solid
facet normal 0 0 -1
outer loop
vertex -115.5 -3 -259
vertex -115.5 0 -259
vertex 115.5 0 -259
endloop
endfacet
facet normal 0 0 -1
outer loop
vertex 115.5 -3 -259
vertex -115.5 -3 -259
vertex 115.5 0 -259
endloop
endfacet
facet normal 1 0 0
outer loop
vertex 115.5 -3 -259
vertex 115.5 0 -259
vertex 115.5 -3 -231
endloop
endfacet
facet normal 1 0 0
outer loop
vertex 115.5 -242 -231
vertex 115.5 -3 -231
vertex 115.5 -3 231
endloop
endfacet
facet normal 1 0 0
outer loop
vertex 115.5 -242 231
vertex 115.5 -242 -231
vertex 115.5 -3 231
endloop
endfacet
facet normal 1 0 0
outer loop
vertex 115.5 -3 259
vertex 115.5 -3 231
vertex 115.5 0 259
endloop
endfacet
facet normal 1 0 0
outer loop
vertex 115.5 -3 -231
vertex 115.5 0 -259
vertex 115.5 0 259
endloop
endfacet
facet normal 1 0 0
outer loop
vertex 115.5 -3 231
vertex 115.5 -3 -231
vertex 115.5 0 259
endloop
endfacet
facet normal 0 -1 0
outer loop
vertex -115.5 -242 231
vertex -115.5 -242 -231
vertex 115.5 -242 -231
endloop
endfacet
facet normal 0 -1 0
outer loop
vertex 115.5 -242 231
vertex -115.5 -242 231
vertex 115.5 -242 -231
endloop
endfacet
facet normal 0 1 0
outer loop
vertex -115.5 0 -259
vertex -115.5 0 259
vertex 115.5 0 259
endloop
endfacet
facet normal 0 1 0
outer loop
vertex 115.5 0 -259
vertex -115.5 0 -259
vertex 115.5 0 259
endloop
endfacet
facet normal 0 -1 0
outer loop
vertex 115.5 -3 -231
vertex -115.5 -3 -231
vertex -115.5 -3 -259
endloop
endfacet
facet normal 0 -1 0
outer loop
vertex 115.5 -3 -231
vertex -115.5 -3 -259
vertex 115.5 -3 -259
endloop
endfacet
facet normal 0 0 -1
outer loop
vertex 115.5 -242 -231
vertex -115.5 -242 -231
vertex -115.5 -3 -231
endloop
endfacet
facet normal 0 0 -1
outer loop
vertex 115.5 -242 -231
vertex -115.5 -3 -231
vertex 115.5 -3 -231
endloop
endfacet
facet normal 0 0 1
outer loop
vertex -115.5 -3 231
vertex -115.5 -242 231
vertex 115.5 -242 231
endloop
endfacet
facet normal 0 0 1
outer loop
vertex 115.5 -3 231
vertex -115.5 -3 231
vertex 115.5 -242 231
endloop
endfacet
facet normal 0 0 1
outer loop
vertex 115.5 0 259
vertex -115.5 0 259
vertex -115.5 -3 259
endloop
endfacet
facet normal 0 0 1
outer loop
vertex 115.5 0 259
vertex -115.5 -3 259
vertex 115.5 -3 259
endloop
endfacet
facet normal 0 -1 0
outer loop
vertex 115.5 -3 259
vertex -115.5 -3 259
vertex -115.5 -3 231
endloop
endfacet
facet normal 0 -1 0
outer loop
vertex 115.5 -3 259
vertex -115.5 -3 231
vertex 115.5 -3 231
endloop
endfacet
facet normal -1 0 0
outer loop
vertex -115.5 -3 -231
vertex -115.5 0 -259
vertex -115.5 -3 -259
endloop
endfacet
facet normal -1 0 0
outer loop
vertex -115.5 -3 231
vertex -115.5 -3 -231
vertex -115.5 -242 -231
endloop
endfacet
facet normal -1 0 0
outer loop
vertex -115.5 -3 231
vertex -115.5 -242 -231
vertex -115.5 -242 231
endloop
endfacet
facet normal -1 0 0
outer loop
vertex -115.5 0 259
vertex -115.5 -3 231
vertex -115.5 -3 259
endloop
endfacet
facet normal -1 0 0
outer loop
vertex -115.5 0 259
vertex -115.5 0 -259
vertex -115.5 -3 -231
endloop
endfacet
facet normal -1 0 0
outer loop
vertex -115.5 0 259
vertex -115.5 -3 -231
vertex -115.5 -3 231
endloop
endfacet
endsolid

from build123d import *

# Parameters (mm, degrees)
F0_W     = 231
F0_H     = 462
F1_DEPTH = 242
F0_H_2   = 28
F2_DEPTH = 3


with BuildPart() as f1:
    # F0 (on Front) → F1 (new body)
    with BuildSketch(Plane.XZ):
        Rectangle(F0_W, F0_H)
    extrude(amount=F1_DEPTH)

    # F0 (on Front) → F2 (join)
    with BuildSketch(Plane.XZ):
        with Locations((0, 245)):
            Rectangle(F0_W, F0_H_2)
        with Locations((0, -245)):
            Rectangle(F0_W, F0_H_2)
    extrude(amount=F2_DEPTH)


solid = f1.part
